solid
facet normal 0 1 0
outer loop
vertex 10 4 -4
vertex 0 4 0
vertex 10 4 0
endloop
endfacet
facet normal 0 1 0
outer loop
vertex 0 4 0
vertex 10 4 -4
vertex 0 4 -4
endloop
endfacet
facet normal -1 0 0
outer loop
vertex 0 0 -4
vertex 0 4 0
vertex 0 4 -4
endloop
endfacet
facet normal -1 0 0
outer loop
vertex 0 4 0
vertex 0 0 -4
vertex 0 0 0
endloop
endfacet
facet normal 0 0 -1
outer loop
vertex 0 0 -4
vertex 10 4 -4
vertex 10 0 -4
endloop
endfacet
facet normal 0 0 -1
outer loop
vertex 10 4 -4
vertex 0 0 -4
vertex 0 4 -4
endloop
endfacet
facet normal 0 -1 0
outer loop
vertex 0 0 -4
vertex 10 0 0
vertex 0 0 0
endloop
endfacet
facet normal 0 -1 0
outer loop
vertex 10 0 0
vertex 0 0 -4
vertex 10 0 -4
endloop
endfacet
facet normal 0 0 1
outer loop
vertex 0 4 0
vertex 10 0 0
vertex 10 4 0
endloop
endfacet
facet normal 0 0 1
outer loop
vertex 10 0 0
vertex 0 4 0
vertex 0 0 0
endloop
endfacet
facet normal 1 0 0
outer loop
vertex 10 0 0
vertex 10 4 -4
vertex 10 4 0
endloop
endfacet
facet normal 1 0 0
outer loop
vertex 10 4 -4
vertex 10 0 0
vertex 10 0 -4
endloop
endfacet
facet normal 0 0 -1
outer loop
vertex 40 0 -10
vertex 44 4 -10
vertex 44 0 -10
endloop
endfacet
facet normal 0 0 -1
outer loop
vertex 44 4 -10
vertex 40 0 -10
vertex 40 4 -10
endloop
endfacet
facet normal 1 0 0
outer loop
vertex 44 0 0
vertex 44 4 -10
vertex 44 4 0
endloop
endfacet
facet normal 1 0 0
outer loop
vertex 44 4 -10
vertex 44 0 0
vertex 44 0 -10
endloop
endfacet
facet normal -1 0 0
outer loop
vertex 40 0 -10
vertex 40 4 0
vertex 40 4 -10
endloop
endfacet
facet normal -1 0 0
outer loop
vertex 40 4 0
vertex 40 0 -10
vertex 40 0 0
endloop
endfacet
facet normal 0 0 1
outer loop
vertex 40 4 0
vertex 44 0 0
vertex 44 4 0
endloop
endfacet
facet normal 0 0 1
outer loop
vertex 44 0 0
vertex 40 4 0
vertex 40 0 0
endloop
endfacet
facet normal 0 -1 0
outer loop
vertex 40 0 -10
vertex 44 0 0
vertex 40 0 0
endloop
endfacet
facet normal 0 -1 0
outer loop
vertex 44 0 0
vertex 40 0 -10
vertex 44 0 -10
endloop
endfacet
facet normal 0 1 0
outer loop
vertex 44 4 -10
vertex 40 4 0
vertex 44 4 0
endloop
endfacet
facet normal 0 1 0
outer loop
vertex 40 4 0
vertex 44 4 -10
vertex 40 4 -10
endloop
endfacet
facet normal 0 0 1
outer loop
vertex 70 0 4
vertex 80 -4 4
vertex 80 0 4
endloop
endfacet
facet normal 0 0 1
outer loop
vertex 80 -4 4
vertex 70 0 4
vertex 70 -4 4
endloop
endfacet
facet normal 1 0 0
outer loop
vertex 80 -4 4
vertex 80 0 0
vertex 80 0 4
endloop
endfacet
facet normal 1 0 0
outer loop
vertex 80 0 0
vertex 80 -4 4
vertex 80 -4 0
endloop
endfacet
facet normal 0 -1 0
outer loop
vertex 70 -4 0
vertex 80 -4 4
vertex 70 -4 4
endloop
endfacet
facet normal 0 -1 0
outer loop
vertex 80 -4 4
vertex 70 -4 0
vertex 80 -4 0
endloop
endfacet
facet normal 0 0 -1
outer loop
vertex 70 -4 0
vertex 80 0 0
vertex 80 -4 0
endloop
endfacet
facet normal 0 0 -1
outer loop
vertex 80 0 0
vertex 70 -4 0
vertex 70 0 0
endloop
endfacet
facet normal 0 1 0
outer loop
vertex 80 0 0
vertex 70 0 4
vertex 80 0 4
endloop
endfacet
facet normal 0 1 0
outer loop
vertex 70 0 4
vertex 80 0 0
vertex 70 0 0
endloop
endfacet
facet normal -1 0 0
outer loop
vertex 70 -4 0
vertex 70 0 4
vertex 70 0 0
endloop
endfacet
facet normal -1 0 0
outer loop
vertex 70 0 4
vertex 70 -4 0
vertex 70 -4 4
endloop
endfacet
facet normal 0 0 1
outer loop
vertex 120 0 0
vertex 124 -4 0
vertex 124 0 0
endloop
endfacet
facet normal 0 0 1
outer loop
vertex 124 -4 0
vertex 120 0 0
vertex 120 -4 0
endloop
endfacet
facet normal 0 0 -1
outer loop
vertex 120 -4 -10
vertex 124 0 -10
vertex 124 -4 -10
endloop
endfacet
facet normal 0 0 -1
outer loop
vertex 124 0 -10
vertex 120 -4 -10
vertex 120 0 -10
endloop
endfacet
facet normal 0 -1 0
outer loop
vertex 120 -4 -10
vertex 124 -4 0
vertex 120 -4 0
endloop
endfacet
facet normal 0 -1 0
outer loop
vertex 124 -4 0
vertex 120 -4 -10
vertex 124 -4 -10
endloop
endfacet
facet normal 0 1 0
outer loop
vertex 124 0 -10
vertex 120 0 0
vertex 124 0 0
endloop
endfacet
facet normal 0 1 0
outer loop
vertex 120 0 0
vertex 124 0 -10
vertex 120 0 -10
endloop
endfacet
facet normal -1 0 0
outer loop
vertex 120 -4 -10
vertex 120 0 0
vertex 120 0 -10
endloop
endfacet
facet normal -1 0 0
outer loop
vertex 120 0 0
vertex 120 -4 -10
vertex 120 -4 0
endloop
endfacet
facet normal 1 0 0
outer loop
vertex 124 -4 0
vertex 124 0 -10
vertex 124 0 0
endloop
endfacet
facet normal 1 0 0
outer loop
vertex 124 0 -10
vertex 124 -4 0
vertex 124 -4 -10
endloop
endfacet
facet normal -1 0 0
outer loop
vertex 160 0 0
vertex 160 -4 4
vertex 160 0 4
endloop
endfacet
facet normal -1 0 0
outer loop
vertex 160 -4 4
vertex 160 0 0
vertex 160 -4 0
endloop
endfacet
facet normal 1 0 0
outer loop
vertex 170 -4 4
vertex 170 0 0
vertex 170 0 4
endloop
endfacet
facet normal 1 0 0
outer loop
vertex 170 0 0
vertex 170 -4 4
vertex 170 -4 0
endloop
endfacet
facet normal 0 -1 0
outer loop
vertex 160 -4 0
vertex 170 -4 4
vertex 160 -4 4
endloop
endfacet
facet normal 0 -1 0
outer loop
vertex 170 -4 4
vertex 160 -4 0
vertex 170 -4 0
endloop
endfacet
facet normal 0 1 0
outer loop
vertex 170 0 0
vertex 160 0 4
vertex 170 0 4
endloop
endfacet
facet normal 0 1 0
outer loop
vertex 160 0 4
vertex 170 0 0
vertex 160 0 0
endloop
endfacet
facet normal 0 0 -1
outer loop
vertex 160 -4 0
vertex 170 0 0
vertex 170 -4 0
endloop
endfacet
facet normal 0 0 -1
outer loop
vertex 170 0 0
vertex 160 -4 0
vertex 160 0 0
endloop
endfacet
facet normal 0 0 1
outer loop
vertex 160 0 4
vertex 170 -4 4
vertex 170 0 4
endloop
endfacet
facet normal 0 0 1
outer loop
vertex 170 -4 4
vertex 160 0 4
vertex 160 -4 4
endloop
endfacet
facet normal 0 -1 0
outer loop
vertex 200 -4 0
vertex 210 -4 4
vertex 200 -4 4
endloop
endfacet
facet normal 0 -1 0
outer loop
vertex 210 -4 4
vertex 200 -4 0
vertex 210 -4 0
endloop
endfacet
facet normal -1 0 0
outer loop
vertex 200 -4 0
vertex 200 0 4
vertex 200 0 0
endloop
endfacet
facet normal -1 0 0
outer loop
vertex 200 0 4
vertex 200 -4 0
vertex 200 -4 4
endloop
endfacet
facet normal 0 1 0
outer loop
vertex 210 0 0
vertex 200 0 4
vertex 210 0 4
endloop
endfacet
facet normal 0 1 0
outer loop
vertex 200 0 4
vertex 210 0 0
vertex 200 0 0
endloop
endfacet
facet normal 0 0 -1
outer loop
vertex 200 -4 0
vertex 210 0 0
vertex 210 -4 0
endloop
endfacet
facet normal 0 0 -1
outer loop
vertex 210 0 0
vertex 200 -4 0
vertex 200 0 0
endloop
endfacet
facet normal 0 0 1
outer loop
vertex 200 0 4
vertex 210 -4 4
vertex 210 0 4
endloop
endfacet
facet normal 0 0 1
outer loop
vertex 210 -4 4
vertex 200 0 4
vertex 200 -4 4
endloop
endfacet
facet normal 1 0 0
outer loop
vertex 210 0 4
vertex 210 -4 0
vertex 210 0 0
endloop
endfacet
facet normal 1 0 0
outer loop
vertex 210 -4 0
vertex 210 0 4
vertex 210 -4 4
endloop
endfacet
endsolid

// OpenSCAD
// rotate() at exact multiples of 90, which the rest of the corpus never did.
//
// 🔴 THIS CASE EXISTS TO GO RED, AND IT IS THE ONLY CORPUS CASE THAT CAN.
// OpenSCAD's degree trig returns an exact 0 and +/-1 at quadrant multiples;
// `Math.cos(deg * PI/180)` returns 6.12323e-17. Until 2026-08-11 BOTH sides of
// this harness computed the naive value -- `mesh.ts` did, and `canon.mjs` kept
// its own copy that did -- so the epsilon was printed by the instrument about
// itself and no change to the product could move it. Both are fixed; this file
// is what would notice if either regressed.
//
// ⚠ The corpus rotated by [15,25,35] and [0,0,30] and by nothing else, so the
// epsilon could not appear in it and CAD1 would have stayed green through the
// whole defect. The hardware leg caught it, which is a worse place to catch it:
// CAD1H is a tracked count with a baseline, not a pass/fail.
//
// ⚠ THE LAST TWO CHILDREN GUARD THE WRONG FIX, NOT THE DEFECT. A quadrant test
// with any tolerance -- "if it is close to 90, snap it" -- makes the exact rows
// agree while silently straightening a part the operator drew at an angle.
// 89.9999 and 90.0001 are real angles on both sides; if either starts matching
// its neighbouring quadrant, the snap is back.
//
// Spacing is 40mm on x. Every child fits inside a sphere of radius 11.5 about
// its own origin, so no two bounding boxes can touch -- which matters, because
// overlapping top-level solids make the mesh leg UNDECIDABLE and a PENDING
// corpus case FAILS CAD1 rather than passing it quietly.
translate([  0, 0, 0]) rotate([-90,   0,   0]) cube([10, 4, 4]);
translate([ 40, 0, 0]) rotate([  0,  90,   0]) cube([10, 4, 4]);
translate([ 80, 0, 0]) rotate([  0,   0, 180]) cube([10, 4, 4]);
translate([120, 0, 0]) rotate([270,  90, 180]) cube([10, 4, 4]);
translate([160, 0, 0]) rotate([ 89.9999, 0, 0]) cube([10, 4, 4]);
translate([200, 0, 0]) rotate([ 90.0001, 0, 0]) cube([10, 4, 4]);
